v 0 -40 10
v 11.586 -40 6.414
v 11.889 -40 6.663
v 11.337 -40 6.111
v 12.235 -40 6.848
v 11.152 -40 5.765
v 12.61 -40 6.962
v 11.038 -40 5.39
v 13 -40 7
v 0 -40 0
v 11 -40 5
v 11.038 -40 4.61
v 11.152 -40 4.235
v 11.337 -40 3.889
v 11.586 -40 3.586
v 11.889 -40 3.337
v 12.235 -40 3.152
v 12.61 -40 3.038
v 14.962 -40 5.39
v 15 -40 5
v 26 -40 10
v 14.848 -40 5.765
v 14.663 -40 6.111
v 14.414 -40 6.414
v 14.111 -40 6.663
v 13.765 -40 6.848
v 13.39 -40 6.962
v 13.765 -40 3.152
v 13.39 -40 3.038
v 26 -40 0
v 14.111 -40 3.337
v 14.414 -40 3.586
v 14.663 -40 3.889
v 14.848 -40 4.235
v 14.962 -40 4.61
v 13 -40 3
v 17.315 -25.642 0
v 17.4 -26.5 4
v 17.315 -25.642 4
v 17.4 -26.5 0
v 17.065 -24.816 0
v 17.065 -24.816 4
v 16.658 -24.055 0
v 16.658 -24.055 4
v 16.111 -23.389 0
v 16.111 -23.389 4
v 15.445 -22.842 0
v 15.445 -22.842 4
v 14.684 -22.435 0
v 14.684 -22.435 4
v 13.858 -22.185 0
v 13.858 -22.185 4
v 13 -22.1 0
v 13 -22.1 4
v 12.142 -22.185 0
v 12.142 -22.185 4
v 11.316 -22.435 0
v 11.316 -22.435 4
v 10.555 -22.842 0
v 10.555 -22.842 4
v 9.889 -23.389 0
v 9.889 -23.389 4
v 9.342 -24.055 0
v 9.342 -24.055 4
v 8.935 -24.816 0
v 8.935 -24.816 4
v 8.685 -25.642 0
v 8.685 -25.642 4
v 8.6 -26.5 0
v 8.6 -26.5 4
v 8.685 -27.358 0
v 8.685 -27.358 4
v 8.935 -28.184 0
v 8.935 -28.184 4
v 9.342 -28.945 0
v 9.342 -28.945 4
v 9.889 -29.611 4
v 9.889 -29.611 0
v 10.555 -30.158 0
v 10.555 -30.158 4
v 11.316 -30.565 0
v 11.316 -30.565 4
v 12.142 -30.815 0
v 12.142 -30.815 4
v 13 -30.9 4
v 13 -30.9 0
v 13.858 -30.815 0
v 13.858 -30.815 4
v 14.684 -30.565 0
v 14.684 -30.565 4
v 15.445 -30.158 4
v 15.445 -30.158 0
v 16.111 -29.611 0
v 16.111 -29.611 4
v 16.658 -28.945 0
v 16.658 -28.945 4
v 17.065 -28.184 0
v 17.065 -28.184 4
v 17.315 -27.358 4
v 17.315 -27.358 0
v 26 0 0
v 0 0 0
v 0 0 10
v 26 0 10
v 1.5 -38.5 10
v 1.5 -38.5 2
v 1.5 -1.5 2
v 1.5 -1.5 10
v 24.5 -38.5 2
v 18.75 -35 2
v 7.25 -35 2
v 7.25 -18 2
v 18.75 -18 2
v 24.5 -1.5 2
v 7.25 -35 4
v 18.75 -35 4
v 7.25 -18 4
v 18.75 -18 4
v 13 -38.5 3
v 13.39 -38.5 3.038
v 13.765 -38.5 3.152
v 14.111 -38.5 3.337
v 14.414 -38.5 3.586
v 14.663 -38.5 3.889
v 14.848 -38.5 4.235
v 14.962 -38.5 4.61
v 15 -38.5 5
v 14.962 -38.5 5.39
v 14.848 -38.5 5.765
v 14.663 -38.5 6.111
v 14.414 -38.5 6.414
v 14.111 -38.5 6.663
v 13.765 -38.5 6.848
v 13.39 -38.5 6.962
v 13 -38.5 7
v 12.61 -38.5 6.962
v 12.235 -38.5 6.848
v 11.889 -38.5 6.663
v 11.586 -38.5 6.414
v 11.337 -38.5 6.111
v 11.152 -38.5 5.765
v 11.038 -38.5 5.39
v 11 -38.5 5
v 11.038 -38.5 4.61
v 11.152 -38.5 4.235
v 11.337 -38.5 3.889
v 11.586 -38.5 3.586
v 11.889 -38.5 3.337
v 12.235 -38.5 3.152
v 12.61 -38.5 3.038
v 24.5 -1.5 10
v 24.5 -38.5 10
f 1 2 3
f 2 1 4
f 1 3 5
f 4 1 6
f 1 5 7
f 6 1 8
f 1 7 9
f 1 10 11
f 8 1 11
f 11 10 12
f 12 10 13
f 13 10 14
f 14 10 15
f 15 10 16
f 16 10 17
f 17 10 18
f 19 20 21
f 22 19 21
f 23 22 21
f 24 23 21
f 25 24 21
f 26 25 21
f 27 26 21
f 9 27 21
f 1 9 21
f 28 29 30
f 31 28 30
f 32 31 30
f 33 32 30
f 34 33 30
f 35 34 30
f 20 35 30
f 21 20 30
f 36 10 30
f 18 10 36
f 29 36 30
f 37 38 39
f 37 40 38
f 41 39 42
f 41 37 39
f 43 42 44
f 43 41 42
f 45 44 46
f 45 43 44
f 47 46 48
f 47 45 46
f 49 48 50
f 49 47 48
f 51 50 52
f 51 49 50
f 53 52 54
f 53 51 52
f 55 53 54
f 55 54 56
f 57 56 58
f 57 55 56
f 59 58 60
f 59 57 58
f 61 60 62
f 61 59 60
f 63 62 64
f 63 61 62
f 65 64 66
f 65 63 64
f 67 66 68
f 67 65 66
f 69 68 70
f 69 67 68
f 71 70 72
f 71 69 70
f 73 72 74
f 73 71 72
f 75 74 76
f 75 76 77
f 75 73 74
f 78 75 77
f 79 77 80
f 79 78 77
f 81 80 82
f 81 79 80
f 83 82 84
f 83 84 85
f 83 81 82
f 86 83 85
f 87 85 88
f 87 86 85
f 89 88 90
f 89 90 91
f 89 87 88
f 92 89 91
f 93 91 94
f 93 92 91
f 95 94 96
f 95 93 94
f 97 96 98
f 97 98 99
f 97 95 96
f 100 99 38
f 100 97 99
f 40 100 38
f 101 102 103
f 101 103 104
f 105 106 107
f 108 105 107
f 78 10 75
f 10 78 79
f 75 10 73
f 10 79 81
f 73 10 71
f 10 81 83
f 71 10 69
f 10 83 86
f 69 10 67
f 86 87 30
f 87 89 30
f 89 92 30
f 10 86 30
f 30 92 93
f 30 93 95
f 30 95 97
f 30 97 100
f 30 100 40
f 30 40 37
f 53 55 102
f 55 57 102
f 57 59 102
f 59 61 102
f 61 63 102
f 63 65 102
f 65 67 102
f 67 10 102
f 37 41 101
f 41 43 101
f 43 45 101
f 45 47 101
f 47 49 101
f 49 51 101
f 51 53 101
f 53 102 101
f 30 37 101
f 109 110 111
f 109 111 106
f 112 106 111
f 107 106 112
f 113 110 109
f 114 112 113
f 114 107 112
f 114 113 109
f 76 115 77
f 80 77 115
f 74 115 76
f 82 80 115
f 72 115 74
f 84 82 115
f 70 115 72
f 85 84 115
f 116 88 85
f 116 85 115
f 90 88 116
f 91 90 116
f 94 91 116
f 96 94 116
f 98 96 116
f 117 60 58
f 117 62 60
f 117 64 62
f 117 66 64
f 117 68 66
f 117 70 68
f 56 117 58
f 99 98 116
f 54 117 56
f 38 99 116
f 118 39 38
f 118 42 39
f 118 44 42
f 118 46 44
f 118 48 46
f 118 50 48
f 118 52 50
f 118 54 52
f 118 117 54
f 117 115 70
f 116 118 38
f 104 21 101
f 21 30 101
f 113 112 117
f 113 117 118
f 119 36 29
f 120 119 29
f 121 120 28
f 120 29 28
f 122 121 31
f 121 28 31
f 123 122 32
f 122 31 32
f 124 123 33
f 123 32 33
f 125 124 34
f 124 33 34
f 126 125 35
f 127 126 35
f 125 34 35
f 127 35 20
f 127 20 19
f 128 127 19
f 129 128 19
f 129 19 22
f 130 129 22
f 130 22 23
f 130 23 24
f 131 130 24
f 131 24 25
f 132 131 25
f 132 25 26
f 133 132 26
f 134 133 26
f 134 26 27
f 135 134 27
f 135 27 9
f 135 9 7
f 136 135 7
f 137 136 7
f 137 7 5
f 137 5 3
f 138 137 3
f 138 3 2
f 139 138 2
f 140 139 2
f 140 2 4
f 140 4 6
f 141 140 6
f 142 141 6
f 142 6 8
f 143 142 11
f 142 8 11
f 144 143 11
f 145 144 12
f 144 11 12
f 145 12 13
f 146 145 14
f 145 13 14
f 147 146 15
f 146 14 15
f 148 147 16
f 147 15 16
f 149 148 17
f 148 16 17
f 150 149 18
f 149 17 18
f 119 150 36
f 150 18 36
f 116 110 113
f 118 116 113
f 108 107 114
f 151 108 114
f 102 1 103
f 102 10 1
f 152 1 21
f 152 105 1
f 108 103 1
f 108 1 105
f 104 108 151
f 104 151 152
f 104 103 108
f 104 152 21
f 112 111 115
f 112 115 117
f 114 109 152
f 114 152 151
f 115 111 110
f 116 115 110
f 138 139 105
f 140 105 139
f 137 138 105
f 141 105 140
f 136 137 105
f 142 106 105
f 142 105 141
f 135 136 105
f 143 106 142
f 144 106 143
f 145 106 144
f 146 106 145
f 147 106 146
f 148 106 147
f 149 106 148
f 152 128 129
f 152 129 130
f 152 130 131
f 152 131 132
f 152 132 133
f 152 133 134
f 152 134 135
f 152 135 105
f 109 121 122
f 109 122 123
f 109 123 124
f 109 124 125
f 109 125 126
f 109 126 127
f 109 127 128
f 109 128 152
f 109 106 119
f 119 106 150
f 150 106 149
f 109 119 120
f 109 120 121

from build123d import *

# Parameters (mm, degrees)
SKETCH1_W           = 26
SKETCH1_H           = 40
SKETCH1_R           = 4.4
BOSS_EXTRUDE1_DEPTH = 2
SKETCH2_W           = 11.5
SKETCH2_H           = 17
SKETCH2_R           = 4.4
BOSS_EXTRUDE2_DEPTH = 2
SKETCH3_W           = 26
SKETCH3_H           = 40
SKETCH3_W_2         = 23
SKETCH3_H_2         = 37
BOSS_EXTRUDE3_DEPTH = 8
SKETCH4_R           = 2
CUT_EXTRUDE1_DEPTH  = 2


with BuildPart() as part:
    # Sketch1 → Boss-Extrude1 (new body)
    with BuildSketch(Plane.XY):
        with Locations((13, -20)):
            Rectangle(SKETCH1_W, SKETCH1_H)
        with Locations((13, -26.5)):
            Circle(SKETCH1_R, mode=Mode.SUBTRACT)
    extrude(amount=BOSS_EXTRUDE1_DEPTH)

    # Sketch2 → Boss-Extrude2 (add)
    with BuildSketch(Plane.XY.offset(2)):
        with Locations((13, -26.5)):
            Rectangle(SKETCH2_W, SKETCH2_H)
        with Locations((13, -26.5)):
            Circle(SKETCH2_R, mode=Mode.SUBTRACT)
    extrude(amount=BOSS_EXTRUDE2_DEPTH)

    # Sketch3 → Boss-Extrude3 (add)
    with BuildSketch(Plane.XY.offset(2)):
        with Locations((13, -20)):
            Rectangle(SKETCH3_W, SKETCH3_H)
        with Locations((13, -20)):
            Rectangle(SKETCH3_W_2, SKETCH3_H_2, mode=Mode.SUBTRACT)
    extrude(amount=BOSS_EXTRUDE3_DEPTH)

    # Sketch4 → Cut-Extrude1 (cut)
    with BuildSketch(Plane.XZ.offset(40)):
        with Locations(Location((13, 5, 0), (0, 0, 270))):
            Circle(SKETCH4_R)
    extrude(amount=-CUT_EXTRUDE1_DEPTH, mode=Mode.SUBTRACT)


solid = part.part
